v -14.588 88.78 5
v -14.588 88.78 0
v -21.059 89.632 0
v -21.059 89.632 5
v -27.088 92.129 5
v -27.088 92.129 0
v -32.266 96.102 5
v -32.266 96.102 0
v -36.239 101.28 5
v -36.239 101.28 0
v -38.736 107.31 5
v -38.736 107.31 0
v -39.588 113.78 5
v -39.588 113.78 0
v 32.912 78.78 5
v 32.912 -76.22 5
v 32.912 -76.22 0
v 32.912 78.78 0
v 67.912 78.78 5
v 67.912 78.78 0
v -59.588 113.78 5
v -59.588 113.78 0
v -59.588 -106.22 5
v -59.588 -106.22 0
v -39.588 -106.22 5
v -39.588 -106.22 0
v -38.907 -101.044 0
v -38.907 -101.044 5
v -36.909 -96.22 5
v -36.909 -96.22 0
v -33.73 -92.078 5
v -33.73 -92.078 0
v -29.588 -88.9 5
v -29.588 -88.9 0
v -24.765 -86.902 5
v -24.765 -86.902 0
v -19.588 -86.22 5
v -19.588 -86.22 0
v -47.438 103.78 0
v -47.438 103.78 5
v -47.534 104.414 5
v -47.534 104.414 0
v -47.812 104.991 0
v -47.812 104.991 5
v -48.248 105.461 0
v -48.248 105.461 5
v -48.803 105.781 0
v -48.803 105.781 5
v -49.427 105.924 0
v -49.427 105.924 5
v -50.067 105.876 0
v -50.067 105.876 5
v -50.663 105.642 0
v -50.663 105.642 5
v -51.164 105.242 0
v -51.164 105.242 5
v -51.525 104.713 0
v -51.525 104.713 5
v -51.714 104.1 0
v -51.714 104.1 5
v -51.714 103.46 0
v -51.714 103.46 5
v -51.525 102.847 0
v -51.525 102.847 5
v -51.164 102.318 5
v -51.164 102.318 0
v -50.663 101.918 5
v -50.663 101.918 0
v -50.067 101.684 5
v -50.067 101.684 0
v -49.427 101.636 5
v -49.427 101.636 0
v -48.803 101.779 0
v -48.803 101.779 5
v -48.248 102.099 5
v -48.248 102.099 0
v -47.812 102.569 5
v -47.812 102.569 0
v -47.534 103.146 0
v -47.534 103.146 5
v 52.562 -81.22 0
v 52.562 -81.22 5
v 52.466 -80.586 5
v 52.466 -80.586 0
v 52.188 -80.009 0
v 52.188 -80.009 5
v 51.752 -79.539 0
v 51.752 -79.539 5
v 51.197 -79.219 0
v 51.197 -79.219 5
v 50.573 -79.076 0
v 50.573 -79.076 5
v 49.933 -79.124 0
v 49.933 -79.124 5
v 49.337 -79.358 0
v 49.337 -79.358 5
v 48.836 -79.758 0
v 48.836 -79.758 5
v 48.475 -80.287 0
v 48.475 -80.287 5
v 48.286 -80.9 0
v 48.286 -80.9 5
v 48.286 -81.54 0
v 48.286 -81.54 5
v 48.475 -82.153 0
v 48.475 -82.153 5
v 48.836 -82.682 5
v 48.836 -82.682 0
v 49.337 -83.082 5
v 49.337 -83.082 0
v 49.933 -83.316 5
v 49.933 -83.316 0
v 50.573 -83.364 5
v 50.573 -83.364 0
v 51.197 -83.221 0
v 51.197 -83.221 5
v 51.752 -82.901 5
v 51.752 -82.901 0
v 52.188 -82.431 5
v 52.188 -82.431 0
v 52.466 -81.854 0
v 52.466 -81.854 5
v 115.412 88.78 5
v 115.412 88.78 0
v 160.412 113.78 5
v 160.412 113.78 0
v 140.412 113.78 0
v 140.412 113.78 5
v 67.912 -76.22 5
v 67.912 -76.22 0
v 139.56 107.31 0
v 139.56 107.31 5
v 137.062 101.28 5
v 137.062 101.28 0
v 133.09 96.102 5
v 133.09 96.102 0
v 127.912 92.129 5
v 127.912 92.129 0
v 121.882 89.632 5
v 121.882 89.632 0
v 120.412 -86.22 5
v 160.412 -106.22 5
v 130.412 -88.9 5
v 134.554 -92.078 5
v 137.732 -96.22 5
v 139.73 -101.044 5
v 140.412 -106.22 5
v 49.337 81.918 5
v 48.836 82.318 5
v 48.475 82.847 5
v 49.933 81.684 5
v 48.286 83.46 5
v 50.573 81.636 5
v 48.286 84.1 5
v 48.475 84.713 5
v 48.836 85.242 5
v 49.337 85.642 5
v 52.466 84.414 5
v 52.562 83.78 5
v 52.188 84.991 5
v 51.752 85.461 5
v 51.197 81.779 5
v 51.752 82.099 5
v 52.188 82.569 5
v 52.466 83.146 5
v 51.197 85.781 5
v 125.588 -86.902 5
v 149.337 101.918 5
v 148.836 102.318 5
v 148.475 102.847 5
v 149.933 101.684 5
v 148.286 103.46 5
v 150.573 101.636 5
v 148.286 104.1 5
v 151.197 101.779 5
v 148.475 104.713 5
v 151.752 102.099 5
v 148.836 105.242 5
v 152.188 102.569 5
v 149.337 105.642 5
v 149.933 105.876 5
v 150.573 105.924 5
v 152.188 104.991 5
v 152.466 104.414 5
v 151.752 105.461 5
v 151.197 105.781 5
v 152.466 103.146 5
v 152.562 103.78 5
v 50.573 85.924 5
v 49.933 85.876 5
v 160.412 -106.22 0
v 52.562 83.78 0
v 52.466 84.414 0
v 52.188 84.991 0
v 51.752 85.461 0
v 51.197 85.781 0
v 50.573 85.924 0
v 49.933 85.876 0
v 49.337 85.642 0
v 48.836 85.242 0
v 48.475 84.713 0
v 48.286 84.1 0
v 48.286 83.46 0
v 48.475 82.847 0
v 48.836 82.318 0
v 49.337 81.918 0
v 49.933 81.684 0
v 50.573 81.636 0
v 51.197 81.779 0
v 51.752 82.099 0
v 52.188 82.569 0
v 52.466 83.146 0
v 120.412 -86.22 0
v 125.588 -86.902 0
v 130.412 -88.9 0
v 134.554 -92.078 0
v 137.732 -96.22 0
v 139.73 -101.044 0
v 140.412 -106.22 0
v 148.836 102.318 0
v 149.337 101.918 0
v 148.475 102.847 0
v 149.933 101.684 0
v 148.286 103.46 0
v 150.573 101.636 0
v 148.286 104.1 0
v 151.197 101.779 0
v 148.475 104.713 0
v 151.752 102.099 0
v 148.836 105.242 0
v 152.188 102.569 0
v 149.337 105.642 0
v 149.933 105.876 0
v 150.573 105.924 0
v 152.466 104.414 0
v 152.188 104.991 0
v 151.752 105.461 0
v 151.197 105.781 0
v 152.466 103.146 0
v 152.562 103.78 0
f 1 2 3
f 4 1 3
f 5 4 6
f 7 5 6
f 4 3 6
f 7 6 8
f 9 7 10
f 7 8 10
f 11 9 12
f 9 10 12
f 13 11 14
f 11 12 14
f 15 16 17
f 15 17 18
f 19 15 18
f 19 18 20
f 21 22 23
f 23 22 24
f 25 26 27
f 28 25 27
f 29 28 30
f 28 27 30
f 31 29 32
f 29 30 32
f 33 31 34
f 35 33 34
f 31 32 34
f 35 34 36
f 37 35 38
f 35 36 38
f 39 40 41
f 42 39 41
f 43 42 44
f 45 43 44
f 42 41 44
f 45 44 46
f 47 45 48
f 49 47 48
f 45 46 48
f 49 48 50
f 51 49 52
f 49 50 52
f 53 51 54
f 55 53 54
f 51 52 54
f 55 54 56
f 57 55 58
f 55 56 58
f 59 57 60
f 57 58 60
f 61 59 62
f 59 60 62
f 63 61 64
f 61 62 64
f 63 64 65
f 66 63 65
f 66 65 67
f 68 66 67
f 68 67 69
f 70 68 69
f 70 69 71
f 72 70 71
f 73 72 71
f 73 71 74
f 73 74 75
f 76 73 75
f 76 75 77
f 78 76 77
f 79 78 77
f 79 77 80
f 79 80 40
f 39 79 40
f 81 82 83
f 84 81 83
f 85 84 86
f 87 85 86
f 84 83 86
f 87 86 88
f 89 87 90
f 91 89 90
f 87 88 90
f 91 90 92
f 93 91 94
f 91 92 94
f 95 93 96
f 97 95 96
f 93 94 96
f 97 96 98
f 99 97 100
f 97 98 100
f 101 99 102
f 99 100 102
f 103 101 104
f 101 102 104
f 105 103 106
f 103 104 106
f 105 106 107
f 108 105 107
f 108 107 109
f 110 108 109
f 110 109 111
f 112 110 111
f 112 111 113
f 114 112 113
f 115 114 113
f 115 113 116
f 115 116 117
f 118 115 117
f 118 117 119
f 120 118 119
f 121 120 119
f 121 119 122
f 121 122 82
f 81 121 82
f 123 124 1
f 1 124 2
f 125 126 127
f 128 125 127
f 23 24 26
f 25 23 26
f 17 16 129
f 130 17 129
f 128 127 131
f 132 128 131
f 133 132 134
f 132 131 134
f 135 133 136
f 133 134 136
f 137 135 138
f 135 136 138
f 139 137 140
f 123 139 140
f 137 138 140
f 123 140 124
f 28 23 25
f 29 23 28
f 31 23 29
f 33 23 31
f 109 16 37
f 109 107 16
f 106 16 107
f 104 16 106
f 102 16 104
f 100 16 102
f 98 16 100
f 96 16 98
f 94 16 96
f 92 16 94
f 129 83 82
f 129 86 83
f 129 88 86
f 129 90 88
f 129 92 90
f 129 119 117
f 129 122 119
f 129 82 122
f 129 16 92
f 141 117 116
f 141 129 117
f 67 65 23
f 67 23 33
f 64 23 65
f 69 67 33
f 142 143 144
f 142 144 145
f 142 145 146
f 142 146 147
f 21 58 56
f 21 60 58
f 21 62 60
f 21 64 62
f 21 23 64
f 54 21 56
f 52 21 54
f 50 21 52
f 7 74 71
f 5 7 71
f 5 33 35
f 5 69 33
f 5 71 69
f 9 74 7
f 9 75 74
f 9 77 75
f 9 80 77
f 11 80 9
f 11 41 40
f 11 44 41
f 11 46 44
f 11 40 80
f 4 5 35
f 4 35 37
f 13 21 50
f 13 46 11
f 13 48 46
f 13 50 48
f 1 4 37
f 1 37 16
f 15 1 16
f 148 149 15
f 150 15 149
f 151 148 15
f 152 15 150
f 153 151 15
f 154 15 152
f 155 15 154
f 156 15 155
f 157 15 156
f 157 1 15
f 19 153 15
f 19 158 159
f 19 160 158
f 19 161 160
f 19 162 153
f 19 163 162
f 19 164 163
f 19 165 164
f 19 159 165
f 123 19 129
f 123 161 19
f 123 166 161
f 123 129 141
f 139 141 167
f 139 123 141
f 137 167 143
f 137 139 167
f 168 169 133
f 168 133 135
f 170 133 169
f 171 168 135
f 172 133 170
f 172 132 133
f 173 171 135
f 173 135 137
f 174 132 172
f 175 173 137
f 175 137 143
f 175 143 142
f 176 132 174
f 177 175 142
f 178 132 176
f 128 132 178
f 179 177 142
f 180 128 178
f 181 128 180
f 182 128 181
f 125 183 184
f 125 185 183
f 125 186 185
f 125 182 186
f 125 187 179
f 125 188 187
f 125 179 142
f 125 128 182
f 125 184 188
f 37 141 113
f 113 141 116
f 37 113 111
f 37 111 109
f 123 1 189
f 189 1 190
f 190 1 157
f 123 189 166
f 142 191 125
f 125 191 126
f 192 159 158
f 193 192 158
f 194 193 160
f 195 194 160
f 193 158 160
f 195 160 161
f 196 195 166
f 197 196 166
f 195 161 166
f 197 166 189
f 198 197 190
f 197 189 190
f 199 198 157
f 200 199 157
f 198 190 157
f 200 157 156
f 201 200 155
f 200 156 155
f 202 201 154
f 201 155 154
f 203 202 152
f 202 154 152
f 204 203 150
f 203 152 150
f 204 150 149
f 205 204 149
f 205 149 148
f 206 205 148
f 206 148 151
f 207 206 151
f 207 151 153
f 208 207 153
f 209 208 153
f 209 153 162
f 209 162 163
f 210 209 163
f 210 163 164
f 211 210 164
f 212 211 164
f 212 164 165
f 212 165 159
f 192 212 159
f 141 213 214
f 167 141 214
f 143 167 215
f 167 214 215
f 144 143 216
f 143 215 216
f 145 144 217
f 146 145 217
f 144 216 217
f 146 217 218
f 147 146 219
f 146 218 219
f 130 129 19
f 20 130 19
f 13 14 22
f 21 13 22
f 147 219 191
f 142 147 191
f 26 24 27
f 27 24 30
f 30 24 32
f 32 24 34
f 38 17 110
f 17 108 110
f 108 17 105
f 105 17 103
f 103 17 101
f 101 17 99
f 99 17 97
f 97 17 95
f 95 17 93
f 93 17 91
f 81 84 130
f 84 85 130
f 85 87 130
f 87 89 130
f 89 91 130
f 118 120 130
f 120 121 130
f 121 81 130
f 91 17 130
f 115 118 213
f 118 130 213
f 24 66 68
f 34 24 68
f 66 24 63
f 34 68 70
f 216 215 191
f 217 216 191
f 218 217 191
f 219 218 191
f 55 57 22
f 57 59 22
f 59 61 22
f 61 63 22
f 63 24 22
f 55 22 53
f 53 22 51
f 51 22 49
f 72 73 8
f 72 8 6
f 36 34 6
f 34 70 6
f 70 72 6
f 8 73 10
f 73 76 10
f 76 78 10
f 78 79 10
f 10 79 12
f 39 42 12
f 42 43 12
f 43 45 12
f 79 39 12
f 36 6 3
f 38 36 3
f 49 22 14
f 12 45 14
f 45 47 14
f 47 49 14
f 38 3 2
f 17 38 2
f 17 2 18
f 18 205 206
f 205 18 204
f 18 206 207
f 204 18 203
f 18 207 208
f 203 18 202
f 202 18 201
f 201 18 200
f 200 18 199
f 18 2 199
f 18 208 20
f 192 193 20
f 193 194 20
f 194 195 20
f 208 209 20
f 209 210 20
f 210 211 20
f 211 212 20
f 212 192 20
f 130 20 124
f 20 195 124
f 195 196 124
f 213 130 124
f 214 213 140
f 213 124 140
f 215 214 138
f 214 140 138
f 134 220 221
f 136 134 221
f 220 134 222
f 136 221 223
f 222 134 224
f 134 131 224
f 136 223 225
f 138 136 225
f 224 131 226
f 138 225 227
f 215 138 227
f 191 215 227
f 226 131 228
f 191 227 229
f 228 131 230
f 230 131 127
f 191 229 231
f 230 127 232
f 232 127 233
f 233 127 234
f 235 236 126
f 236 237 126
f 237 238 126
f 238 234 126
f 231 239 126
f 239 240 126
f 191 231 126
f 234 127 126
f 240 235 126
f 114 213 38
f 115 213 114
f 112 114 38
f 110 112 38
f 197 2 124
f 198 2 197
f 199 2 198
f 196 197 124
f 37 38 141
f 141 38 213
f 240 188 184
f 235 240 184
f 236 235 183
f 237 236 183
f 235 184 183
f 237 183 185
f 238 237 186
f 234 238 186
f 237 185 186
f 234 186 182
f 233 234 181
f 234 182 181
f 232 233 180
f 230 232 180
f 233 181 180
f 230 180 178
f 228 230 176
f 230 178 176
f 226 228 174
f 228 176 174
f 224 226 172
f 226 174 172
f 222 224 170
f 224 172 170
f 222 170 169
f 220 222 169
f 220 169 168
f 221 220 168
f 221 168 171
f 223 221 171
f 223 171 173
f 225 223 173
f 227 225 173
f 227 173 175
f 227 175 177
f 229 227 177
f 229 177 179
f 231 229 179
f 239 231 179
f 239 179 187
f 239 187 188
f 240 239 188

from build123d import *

# Parameters (mm, degrees)
F1_DEPTH = 5
F2_W     = 35
F2_H     = 155
F3_DEPTH = 5.001
F4_R     = 2.15
F5_DEPTH = 5.001


# Not quite as in the source:
# - a feature names something its author has since deleted; it is built from what else it names


with BuildPart() as f1:
    # F0 (on Top) → F1 (new body)
    with BuildSketch(Plane.XY):
        with BuildLine():
            Line((-39.5881515363, 113.7799814343), (-59.5881515363, 113.7799814343))
            Line((-59.5881515363, 113.7799814343), (-59.5881515363, -106.2200185657))
            Line((-59.5881515363, -106.2200185657), (-39.5881515363, -106.2200185657))
            ThreePointArc((-39.5881515363, -106.2200185657), (-33.7302871601, -92.0778829419), (-19.5881515363, -86.2200185657))
            Line((-19.5881515363, -86.2200185657), (120.4118484637, -86.2200185657))
            ThreePointArc((120.4118484637, -86.2200185657), (134.5539840874, -92.0778829419), (140.4118484637, -106.2200185657))
            Line((140.4118484637, -106.2200185657), (160.4118484637, -106.2200185657))
            Line((160.4118484637, -106.2200185657), (160.4118484637, 113.7799814343))
            Line((160.4118484637, 113.7799814343), (140.4118484637, 113.7799814343))
            ThreePointArc((140.4118484637, 113.7799814343), (133.0895179933, 96.1023119047), (115.4118484637, 88.7799814343))
            Line((115.4118484637, 88.7799814343), (-14.5881515363, 88.7799814343))
            ThreePointArc((-14.5881515363, 88.7799814343), (-32.265821066, 96.1023119047), (-39.5881515363, 113.7799814343))
        make_face()
    extrude(amount=F1_DEPTH)

    # F2 (on face) → F3 (cut, through all)
    with BuildSketch(Plane.XY.offset(5)):
        with Locations((50.4118484637, 1.2799814343)):
            Rectangle(F2_W, F2_H)
    extrude(amount=-F3_DEPTH, mode=Mode.SUBTRACT)

    # F4 (on face) → F5 (cut, through all)
    with BuildSketch(Plane.XY.offset(5)):
        with Locations((-49.5881515363, 103.7799814343)):
            Circle(F4_R)
        with Locations((150.4118484637, 103.7799814343)):
            Circle(F4_R)
        with Locations((50.4118484637, 83.7799814343)):
            Circle(F4_R)
        with Locations((50.4118484637, -81.2200185657)):
            Circle(F4_R)
    extrude(amount=-F5_DEPTH, mode=Mode.SUBTRACT)


solid = f1.part
